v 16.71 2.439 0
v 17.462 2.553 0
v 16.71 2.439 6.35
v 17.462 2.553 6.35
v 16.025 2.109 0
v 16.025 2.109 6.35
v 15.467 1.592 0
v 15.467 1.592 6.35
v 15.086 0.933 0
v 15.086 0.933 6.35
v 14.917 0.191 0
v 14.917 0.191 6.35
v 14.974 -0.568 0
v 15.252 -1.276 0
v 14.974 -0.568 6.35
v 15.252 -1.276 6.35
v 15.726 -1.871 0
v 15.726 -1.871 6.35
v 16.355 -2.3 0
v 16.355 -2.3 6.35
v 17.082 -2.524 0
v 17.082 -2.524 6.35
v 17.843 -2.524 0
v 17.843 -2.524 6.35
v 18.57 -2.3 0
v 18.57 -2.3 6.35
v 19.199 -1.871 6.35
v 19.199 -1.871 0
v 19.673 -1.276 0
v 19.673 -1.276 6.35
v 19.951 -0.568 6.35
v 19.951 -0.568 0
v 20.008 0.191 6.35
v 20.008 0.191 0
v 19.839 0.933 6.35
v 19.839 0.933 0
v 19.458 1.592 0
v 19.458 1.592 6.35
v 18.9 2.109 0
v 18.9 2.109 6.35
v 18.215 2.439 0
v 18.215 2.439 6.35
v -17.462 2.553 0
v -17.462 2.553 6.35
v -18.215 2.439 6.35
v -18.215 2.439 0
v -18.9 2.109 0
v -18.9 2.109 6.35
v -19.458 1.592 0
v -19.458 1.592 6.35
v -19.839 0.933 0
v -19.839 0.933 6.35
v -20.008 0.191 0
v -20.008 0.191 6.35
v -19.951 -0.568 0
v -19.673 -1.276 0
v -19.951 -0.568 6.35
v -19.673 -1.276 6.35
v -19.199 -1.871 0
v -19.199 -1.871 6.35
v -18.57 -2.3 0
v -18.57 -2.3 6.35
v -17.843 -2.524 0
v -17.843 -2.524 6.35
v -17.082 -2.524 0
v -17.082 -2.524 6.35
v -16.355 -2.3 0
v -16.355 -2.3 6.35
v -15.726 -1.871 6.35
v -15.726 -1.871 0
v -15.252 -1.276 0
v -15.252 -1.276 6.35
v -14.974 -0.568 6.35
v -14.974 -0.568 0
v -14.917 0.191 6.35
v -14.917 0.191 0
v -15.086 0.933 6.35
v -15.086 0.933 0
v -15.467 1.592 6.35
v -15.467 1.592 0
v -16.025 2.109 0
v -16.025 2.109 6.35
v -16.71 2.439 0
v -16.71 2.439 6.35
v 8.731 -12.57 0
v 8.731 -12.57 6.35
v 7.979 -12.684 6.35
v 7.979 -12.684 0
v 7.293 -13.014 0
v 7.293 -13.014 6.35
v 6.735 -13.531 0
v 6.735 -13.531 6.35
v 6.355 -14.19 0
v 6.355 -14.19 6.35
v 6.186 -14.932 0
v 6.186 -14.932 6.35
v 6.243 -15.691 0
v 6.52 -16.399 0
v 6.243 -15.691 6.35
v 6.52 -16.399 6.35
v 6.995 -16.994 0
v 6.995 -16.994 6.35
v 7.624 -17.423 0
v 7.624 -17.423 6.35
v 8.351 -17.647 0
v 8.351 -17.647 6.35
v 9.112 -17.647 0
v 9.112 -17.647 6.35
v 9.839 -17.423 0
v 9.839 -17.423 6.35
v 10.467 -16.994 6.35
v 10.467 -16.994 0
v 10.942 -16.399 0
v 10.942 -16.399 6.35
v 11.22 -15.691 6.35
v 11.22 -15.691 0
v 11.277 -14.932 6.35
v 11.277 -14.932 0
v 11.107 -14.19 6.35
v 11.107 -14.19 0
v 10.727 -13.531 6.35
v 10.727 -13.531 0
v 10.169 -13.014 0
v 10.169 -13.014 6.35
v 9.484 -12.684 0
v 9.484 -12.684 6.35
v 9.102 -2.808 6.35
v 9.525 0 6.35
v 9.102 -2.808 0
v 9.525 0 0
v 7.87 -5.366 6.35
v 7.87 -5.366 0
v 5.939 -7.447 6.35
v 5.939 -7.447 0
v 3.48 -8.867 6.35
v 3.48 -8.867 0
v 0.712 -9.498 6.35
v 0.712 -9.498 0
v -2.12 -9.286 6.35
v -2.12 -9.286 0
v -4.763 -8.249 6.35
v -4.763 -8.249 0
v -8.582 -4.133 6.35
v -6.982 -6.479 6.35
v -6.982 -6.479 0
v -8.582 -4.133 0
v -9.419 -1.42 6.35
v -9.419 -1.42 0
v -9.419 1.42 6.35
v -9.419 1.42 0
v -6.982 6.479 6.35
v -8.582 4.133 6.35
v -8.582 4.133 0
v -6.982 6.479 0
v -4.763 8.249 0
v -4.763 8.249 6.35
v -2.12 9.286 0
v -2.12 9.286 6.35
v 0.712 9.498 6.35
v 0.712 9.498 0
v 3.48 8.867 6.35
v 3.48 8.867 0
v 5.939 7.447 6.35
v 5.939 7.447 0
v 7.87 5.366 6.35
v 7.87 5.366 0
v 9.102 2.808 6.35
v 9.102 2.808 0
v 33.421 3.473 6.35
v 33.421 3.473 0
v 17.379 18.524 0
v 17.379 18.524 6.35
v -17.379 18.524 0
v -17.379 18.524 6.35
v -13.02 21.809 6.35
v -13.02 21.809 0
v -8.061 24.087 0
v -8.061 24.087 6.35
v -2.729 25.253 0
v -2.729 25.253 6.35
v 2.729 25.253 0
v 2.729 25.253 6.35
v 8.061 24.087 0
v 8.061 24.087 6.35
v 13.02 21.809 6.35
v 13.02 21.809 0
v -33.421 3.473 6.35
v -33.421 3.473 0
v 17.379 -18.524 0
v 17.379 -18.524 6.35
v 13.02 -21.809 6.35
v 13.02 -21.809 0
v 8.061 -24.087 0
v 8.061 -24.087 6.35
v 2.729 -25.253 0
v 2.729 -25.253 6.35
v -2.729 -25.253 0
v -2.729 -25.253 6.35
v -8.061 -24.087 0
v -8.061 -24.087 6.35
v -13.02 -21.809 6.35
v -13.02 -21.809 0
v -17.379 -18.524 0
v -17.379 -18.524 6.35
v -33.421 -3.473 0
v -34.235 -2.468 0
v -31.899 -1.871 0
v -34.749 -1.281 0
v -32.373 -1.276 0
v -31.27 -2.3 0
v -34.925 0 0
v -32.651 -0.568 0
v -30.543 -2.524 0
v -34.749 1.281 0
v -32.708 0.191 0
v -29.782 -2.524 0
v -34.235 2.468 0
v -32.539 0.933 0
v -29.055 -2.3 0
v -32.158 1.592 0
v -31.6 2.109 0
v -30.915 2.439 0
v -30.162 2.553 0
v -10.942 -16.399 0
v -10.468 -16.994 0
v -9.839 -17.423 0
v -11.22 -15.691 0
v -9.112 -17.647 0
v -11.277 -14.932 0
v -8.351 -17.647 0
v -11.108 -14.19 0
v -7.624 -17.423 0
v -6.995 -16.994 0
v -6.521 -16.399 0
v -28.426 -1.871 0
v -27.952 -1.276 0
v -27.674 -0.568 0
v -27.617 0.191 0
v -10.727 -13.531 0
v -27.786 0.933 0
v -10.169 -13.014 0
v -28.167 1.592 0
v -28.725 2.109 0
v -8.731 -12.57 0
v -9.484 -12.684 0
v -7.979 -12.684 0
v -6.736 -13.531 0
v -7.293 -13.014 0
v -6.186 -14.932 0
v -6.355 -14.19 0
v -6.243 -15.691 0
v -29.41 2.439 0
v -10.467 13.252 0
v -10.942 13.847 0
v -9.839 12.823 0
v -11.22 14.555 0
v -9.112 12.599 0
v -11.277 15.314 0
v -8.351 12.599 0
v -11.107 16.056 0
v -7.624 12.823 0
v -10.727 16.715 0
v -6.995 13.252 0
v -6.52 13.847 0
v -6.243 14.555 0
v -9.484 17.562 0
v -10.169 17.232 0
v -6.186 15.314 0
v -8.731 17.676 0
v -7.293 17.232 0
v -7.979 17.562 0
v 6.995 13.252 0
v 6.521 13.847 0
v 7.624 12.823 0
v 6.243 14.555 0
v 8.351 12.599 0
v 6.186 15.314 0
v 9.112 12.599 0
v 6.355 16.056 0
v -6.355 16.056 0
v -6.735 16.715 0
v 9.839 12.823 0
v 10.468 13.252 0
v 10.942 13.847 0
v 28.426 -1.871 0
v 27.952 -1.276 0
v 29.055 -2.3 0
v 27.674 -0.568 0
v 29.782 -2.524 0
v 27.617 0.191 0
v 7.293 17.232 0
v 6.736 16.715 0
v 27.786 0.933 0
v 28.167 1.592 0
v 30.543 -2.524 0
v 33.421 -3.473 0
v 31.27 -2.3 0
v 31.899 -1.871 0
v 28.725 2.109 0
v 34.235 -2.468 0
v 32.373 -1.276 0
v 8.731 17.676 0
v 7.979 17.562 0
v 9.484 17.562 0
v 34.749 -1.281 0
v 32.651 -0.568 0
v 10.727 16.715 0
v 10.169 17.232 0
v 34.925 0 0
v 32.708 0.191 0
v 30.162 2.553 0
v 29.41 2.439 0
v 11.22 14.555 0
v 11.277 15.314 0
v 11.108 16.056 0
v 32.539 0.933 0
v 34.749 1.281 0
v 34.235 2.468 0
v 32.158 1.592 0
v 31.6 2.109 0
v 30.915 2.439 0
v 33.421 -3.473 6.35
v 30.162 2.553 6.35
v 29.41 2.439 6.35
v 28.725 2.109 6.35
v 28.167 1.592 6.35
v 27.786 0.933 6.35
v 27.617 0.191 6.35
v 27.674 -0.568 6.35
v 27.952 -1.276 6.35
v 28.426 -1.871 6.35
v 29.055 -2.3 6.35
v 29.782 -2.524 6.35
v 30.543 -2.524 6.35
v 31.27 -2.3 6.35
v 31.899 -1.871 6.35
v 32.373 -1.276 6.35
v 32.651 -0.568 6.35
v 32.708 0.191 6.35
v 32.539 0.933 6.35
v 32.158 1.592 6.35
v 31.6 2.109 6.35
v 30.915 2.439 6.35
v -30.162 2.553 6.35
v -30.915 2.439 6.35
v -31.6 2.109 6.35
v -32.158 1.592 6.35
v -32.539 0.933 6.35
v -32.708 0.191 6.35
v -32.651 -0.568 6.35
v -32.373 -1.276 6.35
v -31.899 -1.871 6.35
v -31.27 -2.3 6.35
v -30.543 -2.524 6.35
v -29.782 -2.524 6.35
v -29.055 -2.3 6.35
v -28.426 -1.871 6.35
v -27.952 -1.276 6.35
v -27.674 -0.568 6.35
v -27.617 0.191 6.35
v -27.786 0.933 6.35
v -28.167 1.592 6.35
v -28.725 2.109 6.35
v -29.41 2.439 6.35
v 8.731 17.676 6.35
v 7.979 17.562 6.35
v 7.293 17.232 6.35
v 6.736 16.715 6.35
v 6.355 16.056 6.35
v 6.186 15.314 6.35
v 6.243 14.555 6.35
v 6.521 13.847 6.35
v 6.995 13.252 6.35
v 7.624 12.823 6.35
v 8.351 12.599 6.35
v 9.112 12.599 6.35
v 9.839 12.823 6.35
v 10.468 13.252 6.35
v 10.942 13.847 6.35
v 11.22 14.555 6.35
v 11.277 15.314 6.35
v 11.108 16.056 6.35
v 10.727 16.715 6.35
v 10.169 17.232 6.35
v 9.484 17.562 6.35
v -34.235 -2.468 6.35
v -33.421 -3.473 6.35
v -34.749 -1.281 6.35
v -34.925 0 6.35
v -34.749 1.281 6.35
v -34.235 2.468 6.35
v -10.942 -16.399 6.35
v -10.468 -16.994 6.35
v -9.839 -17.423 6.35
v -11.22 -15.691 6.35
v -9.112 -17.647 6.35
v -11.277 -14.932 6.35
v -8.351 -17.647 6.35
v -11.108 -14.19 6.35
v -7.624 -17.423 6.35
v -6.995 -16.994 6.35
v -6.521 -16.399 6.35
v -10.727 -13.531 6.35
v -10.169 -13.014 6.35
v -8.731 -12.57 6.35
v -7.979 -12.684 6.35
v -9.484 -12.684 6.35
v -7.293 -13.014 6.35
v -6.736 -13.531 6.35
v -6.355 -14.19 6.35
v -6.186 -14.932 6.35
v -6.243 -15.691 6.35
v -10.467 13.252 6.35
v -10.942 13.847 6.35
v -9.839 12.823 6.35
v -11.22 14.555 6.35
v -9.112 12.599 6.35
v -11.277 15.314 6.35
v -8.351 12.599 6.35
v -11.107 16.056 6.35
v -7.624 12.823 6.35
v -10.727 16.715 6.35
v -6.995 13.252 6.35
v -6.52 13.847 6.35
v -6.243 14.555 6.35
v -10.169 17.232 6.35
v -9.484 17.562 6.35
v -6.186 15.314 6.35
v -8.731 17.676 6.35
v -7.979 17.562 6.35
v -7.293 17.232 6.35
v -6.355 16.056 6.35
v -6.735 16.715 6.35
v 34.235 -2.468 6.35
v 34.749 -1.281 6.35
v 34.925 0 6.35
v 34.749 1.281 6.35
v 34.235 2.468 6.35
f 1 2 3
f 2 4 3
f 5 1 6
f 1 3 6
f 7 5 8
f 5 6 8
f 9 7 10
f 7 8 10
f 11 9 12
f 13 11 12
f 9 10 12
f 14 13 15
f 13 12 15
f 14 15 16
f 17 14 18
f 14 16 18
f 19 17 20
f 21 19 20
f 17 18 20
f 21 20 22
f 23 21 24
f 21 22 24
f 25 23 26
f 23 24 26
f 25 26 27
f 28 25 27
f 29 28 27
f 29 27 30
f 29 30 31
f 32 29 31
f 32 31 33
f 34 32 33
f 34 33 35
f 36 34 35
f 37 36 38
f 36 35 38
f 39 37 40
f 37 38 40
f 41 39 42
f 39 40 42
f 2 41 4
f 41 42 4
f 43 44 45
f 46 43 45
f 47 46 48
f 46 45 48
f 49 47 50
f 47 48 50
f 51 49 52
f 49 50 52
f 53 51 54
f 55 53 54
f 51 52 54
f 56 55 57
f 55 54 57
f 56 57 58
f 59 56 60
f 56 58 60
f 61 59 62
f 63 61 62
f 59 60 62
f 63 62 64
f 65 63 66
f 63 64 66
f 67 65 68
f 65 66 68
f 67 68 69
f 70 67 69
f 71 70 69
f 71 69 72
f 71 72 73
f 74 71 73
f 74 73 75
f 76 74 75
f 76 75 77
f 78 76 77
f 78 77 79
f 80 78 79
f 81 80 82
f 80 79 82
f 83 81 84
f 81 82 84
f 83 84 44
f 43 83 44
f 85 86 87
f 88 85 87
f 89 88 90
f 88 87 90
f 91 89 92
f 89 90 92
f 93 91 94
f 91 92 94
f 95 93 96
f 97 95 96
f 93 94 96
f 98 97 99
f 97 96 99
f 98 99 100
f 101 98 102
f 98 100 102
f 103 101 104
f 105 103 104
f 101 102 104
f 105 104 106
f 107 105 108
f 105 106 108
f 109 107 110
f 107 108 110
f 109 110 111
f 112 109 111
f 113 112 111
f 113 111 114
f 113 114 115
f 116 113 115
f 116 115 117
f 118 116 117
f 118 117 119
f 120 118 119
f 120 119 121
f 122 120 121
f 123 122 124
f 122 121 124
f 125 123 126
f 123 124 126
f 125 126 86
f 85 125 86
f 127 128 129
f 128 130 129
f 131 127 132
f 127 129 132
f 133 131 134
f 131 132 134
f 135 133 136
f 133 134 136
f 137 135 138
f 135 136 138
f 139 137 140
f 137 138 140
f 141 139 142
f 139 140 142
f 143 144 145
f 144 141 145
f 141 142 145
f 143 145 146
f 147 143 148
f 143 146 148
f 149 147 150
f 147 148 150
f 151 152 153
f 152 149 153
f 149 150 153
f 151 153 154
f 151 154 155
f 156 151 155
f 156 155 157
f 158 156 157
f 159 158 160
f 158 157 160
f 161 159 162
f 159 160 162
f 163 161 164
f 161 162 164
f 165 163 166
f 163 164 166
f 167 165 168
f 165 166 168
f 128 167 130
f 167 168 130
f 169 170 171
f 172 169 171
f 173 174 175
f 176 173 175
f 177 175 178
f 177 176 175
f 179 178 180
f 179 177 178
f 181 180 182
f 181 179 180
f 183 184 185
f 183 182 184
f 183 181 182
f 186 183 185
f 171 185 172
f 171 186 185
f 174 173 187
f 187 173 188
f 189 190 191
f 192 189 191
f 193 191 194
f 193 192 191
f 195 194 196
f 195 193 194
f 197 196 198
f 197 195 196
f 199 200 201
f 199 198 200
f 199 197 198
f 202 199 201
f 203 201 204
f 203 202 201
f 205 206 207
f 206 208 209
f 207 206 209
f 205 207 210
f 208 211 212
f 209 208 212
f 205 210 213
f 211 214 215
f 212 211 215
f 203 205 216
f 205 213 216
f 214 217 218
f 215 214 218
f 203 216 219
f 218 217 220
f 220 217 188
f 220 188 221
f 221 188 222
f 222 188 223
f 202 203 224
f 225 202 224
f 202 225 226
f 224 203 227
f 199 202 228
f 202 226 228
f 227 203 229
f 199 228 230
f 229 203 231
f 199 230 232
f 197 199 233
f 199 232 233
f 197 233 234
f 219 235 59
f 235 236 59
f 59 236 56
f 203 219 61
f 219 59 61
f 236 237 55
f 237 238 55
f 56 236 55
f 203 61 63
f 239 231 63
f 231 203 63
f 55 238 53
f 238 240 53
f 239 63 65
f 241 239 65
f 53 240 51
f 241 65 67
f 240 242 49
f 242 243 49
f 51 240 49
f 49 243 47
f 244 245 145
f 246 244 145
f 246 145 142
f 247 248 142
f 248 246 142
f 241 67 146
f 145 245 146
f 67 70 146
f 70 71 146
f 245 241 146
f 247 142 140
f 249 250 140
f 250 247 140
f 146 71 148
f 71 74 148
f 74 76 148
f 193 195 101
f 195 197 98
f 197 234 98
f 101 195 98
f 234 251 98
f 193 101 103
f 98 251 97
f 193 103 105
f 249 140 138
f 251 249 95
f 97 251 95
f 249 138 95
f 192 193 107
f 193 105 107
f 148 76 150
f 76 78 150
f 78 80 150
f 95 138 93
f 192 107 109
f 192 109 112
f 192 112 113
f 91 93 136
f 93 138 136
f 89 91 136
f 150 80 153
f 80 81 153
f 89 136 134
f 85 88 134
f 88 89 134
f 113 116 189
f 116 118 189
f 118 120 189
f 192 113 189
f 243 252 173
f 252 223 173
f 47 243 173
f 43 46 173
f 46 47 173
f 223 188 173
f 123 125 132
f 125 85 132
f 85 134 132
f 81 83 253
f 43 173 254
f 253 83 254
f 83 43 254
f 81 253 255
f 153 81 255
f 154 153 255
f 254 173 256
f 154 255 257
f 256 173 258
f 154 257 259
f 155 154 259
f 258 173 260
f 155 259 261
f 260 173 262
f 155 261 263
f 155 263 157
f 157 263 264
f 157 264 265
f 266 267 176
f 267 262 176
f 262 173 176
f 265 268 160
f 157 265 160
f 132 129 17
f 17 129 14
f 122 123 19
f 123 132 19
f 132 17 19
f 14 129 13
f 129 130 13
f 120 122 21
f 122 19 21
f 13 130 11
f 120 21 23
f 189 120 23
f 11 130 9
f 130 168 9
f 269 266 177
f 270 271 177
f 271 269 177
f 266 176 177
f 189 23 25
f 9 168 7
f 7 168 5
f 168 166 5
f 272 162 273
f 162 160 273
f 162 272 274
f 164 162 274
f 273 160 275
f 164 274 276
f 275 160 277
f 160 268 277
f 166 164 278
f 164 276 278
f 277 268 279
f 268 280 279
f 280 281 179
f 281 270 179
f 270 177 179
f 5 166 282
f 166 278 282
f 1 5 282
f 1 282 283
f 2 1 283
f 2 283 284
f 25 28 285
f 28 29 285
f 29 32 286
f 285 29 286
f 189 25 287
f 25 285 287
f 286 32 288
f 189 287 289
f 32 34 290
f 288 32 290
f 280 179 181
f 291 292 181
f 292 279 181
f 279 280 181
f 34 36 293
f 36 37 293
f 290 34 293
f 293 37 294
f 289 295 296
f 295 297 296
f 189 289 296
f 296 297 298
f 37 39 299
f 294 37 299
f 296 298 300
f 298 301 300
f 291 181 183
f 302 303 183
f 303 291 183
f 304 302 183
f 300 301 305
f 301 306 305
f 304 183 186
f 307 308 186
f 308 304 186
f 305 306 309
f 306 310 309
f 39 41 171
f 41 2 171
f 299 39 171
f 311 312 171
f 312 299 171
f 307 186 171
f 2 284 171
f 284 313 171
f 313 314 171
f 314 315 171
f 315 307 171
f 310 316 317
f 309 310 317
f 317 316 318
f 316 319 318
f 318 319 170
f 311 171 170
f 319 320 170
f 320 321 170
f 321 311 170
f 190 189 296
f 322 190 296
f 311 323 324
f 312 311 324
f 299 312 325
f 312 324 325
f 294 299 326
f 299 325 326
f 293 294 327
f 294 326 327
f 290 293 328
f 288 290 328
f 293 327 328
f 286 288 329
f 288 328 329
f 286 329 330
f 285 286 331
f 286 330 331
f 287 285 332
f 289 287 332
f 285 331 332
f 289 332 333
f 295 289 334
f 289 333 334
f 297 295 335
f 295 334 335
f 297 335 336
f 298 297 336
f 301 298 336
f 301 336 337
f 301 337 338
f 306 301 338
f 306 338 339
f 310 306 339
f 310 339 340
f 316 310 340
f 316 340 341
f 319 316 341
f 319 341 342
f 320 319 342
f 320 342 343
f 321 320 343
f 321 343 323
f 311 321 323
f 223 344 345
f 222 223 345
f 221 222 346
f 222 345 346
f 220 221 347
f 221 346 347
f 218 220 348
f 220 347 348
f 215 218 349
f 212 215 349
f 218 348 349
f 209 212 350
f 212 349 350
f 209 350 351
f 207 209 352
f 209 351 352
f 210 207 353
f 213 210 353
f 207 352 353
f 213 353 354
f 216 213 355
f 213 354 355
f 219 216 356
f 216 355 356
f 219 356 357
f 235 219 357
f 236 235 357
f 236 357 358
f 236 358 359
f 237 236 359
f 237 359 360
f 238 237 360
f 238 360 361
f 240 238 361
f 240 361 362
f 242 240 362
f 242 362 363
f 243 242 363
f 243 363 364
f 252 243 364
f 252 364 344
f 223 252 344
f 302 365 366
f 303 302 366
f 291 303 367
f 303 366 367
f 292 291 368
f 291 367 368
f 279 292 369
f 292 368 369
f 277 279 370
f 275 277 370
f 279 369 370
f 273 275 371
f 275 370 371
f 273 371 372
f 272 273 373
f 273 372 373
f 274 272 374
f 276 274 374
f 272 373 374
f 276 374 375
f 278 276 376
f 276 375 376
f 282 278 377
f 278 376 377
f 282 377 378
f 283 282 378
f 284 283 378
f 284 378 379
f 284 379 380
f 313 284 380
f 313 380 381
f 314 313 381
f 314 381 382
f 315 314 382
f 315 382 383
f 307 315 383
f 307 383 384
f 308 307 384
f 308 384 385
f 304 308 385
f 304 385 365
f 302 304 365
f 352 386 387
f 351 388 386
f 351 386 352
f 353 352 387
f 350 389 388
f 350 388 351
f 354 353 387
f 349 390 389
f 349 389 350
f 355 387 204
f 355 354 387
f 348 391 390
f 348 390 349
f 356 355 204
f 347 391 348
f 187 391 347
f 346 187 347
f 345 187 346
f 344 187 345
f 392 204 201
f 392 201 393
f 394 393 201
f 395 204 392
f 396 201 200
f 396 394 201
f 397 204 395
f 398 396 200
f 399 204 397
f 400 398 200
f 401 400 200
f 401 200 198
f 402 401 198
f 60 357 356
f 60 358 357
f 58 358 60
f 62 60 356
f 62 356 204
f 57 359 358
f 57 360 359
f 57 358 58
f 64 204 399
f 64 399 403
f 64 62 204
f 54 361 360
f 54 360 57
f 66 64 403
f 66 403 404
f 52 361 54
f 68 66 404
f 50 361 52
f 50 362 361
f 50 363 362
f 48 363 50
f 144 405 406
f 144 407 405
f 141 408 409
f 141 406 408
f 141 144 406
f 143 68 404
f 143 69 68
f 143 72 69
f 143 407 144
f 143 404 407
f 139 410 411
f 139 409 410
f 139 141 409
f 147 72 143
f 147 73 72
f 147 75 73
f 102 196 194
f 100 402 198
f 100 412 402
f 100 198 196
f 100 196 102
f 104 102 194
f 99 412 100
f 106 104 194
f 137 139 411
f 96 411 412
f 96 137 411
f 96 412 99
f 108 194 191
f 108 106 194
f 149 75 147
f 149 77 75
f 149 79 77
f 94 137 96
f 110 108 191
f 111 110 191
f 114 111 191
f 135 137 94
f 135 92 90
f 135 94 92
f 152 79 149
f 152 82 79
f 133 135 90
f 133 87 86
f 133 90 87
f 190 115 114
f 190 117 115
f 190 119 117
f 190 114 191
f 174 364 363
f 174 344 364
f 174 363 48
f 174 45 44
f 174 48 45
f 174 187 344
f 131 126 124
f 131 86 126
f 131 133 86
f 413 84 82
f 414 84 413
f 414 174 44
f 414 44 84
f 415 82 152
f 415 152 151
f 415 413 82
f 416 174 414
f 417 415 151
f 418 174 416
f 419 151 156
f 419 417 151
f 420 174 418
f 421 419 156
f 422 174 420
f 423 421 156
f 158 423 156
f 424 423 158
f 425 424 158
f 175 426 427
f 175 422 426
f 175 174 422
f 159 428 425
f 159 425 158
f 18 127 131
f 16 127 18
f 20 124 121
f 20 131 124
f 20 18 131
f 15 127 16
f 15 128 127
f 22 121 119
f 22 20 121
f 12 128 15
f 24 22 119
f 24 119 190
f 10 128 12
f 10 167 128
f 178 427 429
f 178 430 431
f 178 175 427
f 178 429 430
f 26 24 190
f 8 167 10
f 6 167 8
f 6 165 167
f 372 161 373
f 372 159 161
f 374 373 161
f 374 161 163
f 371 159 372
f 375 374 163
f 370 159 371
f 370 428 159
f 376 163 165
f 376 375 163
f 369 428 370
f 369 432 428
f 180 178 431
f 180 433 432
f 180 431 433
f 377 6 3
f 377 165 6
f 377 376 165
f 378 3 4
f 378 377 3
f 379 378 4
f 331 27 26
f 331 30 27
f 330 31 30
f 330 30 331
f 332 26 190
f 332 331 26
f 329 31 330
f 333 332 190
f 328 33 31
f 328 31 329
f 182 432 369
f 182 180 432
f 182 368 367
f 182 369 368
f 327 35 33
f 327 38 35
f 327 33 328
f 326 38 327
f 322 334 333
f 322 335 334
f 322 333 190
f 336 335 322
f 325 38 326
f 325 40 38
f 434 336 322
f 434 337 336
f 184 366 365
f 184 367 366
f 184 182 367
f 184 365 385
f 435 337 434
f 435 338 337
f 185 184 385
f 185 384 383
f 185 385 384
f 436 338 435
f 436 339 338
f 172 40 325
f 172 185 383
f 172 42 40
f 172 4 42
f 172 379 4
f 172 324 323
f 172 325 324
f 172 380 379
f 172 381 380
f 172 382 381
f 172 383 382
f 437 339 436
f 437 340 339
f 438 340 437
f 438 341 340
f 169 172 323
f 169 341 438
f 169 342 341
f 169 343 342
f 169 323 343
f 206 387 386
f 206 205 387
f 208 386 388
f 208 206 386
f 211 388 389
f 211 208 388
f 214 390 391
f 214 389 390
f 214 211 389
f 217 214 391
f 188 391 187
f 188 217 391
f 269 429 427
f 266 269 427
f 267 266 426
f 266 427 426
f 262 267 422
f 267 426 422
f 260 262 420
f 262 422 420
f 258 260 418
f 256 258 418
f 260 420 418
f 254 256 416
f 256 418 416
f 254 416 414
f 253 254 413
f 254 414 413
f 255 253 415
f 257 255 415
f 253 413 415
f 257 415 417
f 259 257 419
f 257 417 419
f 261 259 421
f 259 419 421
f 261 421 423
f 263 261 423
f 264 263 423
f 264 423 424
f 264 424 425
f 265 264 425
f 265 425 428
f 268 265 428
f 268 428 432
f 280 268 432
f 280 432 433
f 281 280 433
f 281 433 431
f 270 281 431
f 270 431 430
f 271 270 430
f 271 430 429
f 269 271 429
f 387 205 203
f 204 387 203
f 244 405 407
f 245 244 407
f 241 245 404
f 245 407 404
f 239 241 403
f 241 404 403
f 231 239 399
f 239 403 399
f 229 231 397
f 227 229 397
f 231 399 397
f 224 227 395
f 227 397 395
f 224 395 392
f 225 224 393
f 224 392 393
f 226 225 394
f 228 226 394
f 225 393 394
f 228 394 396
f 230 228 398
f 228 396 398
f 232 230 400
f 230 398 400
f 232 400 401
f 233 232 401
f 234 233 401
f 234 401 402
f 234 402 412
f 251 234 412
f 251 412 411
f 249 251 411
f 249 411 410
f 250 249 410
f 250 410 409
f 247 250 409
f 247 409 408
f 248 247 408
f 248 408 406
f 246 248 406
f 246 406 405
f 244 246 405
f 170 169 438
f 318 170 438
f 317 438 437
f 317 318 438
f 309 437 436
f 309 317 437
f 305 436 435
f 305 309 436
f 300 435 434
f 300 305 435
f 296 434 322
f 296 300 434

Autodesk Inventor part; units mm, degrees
ref_plane "YZ Plane" through (0, 0, 0) normal (1, 0, 0) x (0, 1, 0)
ref_plane "XZ Plane" through (0, 0, 0) normal (0, 1, 0) x (-1, 0, 0)
ref_plane "XY Plane" through (0, 0, 0) normal (0, 0, 1) x (1, 0, 0)
sketch "Sketch1" plane through (0, 0, 0) normal (0, 0, 1) x (1, 0, 0)
  circle A0 centre (0, 0) radius 9.525
  circle A1 centre (0, 0) radius 25.4 construction
  circle A2 centre (-30.1625, 0) radius 4.7625 construction
  circle A3 centre (30.1625, 0) radius 4.7625 construction
  circle A4 centre (0, 0) radius 17.4625 construction
  line L0 (-17.3789, 18.5238) -> (-33.4211, 3.4732)
  line L1 (-33.4211, -3.4732) -> (-17.3789, -18.5238)
  line L2 (17.3789, -18.5238) -> (33.4211, -3.4732)
  line L3 (33.4211, 3.4732) -> (17.3789, 18.5238)
  arc A5 (-33.4211, 3.4732) -> (-33.4211, -3.4732) centre (-30.1625, 0) ccw
  arc A6 (-17.3789, -18.5238) -> (17.3789, -18.5238) centre (0, 0) ccw
  arc A7 (33.4211, -3.4732) -> (33.4211, 3.4732) centre (30.1625, 0) ccw
  arc A8 (17.3789, 18.5238) -> (-17.3789, 18.5238) centre (0, 0) ccw
  point P0 (-17.4625, 0)
  point P1 (-8.7313, -15.123)
  point P2 (8.7312, -15.123)
  point P3 (17.4625, 0)
  point P4 (8.7313, 15.123)
  point P5 (-8.7312, 15.123)
  dimension "d3" = 34.925
  dimension "d0" = 19.05
  dimension "d1" = 50.8
  dimension "d2" = 9.525
  dimension "d6" = 360
extrude "Extrusion1" add sketch "Sketch1" along normal blind 6.35
hole "Hole1" at (-17.4625, 0, 0) at (-8.7313, -15.123, 0) at (8.7312, -15.123, 0) at (17.4625, 0, 0) at (8.7313, 15.123, 0) at (-8.7312, 15.123, 0) at (-30.1625, 0, 0) at (30.1625, 0, 0) direction (0, 0, 1) diameter 5.1054 end through all clearance for "Flat Head Machine Screw (82)" size "#10" standard "Ansi Unified Screw Threads"
properties part number "GP7-003" material "Polycarbonate, Smoke"
